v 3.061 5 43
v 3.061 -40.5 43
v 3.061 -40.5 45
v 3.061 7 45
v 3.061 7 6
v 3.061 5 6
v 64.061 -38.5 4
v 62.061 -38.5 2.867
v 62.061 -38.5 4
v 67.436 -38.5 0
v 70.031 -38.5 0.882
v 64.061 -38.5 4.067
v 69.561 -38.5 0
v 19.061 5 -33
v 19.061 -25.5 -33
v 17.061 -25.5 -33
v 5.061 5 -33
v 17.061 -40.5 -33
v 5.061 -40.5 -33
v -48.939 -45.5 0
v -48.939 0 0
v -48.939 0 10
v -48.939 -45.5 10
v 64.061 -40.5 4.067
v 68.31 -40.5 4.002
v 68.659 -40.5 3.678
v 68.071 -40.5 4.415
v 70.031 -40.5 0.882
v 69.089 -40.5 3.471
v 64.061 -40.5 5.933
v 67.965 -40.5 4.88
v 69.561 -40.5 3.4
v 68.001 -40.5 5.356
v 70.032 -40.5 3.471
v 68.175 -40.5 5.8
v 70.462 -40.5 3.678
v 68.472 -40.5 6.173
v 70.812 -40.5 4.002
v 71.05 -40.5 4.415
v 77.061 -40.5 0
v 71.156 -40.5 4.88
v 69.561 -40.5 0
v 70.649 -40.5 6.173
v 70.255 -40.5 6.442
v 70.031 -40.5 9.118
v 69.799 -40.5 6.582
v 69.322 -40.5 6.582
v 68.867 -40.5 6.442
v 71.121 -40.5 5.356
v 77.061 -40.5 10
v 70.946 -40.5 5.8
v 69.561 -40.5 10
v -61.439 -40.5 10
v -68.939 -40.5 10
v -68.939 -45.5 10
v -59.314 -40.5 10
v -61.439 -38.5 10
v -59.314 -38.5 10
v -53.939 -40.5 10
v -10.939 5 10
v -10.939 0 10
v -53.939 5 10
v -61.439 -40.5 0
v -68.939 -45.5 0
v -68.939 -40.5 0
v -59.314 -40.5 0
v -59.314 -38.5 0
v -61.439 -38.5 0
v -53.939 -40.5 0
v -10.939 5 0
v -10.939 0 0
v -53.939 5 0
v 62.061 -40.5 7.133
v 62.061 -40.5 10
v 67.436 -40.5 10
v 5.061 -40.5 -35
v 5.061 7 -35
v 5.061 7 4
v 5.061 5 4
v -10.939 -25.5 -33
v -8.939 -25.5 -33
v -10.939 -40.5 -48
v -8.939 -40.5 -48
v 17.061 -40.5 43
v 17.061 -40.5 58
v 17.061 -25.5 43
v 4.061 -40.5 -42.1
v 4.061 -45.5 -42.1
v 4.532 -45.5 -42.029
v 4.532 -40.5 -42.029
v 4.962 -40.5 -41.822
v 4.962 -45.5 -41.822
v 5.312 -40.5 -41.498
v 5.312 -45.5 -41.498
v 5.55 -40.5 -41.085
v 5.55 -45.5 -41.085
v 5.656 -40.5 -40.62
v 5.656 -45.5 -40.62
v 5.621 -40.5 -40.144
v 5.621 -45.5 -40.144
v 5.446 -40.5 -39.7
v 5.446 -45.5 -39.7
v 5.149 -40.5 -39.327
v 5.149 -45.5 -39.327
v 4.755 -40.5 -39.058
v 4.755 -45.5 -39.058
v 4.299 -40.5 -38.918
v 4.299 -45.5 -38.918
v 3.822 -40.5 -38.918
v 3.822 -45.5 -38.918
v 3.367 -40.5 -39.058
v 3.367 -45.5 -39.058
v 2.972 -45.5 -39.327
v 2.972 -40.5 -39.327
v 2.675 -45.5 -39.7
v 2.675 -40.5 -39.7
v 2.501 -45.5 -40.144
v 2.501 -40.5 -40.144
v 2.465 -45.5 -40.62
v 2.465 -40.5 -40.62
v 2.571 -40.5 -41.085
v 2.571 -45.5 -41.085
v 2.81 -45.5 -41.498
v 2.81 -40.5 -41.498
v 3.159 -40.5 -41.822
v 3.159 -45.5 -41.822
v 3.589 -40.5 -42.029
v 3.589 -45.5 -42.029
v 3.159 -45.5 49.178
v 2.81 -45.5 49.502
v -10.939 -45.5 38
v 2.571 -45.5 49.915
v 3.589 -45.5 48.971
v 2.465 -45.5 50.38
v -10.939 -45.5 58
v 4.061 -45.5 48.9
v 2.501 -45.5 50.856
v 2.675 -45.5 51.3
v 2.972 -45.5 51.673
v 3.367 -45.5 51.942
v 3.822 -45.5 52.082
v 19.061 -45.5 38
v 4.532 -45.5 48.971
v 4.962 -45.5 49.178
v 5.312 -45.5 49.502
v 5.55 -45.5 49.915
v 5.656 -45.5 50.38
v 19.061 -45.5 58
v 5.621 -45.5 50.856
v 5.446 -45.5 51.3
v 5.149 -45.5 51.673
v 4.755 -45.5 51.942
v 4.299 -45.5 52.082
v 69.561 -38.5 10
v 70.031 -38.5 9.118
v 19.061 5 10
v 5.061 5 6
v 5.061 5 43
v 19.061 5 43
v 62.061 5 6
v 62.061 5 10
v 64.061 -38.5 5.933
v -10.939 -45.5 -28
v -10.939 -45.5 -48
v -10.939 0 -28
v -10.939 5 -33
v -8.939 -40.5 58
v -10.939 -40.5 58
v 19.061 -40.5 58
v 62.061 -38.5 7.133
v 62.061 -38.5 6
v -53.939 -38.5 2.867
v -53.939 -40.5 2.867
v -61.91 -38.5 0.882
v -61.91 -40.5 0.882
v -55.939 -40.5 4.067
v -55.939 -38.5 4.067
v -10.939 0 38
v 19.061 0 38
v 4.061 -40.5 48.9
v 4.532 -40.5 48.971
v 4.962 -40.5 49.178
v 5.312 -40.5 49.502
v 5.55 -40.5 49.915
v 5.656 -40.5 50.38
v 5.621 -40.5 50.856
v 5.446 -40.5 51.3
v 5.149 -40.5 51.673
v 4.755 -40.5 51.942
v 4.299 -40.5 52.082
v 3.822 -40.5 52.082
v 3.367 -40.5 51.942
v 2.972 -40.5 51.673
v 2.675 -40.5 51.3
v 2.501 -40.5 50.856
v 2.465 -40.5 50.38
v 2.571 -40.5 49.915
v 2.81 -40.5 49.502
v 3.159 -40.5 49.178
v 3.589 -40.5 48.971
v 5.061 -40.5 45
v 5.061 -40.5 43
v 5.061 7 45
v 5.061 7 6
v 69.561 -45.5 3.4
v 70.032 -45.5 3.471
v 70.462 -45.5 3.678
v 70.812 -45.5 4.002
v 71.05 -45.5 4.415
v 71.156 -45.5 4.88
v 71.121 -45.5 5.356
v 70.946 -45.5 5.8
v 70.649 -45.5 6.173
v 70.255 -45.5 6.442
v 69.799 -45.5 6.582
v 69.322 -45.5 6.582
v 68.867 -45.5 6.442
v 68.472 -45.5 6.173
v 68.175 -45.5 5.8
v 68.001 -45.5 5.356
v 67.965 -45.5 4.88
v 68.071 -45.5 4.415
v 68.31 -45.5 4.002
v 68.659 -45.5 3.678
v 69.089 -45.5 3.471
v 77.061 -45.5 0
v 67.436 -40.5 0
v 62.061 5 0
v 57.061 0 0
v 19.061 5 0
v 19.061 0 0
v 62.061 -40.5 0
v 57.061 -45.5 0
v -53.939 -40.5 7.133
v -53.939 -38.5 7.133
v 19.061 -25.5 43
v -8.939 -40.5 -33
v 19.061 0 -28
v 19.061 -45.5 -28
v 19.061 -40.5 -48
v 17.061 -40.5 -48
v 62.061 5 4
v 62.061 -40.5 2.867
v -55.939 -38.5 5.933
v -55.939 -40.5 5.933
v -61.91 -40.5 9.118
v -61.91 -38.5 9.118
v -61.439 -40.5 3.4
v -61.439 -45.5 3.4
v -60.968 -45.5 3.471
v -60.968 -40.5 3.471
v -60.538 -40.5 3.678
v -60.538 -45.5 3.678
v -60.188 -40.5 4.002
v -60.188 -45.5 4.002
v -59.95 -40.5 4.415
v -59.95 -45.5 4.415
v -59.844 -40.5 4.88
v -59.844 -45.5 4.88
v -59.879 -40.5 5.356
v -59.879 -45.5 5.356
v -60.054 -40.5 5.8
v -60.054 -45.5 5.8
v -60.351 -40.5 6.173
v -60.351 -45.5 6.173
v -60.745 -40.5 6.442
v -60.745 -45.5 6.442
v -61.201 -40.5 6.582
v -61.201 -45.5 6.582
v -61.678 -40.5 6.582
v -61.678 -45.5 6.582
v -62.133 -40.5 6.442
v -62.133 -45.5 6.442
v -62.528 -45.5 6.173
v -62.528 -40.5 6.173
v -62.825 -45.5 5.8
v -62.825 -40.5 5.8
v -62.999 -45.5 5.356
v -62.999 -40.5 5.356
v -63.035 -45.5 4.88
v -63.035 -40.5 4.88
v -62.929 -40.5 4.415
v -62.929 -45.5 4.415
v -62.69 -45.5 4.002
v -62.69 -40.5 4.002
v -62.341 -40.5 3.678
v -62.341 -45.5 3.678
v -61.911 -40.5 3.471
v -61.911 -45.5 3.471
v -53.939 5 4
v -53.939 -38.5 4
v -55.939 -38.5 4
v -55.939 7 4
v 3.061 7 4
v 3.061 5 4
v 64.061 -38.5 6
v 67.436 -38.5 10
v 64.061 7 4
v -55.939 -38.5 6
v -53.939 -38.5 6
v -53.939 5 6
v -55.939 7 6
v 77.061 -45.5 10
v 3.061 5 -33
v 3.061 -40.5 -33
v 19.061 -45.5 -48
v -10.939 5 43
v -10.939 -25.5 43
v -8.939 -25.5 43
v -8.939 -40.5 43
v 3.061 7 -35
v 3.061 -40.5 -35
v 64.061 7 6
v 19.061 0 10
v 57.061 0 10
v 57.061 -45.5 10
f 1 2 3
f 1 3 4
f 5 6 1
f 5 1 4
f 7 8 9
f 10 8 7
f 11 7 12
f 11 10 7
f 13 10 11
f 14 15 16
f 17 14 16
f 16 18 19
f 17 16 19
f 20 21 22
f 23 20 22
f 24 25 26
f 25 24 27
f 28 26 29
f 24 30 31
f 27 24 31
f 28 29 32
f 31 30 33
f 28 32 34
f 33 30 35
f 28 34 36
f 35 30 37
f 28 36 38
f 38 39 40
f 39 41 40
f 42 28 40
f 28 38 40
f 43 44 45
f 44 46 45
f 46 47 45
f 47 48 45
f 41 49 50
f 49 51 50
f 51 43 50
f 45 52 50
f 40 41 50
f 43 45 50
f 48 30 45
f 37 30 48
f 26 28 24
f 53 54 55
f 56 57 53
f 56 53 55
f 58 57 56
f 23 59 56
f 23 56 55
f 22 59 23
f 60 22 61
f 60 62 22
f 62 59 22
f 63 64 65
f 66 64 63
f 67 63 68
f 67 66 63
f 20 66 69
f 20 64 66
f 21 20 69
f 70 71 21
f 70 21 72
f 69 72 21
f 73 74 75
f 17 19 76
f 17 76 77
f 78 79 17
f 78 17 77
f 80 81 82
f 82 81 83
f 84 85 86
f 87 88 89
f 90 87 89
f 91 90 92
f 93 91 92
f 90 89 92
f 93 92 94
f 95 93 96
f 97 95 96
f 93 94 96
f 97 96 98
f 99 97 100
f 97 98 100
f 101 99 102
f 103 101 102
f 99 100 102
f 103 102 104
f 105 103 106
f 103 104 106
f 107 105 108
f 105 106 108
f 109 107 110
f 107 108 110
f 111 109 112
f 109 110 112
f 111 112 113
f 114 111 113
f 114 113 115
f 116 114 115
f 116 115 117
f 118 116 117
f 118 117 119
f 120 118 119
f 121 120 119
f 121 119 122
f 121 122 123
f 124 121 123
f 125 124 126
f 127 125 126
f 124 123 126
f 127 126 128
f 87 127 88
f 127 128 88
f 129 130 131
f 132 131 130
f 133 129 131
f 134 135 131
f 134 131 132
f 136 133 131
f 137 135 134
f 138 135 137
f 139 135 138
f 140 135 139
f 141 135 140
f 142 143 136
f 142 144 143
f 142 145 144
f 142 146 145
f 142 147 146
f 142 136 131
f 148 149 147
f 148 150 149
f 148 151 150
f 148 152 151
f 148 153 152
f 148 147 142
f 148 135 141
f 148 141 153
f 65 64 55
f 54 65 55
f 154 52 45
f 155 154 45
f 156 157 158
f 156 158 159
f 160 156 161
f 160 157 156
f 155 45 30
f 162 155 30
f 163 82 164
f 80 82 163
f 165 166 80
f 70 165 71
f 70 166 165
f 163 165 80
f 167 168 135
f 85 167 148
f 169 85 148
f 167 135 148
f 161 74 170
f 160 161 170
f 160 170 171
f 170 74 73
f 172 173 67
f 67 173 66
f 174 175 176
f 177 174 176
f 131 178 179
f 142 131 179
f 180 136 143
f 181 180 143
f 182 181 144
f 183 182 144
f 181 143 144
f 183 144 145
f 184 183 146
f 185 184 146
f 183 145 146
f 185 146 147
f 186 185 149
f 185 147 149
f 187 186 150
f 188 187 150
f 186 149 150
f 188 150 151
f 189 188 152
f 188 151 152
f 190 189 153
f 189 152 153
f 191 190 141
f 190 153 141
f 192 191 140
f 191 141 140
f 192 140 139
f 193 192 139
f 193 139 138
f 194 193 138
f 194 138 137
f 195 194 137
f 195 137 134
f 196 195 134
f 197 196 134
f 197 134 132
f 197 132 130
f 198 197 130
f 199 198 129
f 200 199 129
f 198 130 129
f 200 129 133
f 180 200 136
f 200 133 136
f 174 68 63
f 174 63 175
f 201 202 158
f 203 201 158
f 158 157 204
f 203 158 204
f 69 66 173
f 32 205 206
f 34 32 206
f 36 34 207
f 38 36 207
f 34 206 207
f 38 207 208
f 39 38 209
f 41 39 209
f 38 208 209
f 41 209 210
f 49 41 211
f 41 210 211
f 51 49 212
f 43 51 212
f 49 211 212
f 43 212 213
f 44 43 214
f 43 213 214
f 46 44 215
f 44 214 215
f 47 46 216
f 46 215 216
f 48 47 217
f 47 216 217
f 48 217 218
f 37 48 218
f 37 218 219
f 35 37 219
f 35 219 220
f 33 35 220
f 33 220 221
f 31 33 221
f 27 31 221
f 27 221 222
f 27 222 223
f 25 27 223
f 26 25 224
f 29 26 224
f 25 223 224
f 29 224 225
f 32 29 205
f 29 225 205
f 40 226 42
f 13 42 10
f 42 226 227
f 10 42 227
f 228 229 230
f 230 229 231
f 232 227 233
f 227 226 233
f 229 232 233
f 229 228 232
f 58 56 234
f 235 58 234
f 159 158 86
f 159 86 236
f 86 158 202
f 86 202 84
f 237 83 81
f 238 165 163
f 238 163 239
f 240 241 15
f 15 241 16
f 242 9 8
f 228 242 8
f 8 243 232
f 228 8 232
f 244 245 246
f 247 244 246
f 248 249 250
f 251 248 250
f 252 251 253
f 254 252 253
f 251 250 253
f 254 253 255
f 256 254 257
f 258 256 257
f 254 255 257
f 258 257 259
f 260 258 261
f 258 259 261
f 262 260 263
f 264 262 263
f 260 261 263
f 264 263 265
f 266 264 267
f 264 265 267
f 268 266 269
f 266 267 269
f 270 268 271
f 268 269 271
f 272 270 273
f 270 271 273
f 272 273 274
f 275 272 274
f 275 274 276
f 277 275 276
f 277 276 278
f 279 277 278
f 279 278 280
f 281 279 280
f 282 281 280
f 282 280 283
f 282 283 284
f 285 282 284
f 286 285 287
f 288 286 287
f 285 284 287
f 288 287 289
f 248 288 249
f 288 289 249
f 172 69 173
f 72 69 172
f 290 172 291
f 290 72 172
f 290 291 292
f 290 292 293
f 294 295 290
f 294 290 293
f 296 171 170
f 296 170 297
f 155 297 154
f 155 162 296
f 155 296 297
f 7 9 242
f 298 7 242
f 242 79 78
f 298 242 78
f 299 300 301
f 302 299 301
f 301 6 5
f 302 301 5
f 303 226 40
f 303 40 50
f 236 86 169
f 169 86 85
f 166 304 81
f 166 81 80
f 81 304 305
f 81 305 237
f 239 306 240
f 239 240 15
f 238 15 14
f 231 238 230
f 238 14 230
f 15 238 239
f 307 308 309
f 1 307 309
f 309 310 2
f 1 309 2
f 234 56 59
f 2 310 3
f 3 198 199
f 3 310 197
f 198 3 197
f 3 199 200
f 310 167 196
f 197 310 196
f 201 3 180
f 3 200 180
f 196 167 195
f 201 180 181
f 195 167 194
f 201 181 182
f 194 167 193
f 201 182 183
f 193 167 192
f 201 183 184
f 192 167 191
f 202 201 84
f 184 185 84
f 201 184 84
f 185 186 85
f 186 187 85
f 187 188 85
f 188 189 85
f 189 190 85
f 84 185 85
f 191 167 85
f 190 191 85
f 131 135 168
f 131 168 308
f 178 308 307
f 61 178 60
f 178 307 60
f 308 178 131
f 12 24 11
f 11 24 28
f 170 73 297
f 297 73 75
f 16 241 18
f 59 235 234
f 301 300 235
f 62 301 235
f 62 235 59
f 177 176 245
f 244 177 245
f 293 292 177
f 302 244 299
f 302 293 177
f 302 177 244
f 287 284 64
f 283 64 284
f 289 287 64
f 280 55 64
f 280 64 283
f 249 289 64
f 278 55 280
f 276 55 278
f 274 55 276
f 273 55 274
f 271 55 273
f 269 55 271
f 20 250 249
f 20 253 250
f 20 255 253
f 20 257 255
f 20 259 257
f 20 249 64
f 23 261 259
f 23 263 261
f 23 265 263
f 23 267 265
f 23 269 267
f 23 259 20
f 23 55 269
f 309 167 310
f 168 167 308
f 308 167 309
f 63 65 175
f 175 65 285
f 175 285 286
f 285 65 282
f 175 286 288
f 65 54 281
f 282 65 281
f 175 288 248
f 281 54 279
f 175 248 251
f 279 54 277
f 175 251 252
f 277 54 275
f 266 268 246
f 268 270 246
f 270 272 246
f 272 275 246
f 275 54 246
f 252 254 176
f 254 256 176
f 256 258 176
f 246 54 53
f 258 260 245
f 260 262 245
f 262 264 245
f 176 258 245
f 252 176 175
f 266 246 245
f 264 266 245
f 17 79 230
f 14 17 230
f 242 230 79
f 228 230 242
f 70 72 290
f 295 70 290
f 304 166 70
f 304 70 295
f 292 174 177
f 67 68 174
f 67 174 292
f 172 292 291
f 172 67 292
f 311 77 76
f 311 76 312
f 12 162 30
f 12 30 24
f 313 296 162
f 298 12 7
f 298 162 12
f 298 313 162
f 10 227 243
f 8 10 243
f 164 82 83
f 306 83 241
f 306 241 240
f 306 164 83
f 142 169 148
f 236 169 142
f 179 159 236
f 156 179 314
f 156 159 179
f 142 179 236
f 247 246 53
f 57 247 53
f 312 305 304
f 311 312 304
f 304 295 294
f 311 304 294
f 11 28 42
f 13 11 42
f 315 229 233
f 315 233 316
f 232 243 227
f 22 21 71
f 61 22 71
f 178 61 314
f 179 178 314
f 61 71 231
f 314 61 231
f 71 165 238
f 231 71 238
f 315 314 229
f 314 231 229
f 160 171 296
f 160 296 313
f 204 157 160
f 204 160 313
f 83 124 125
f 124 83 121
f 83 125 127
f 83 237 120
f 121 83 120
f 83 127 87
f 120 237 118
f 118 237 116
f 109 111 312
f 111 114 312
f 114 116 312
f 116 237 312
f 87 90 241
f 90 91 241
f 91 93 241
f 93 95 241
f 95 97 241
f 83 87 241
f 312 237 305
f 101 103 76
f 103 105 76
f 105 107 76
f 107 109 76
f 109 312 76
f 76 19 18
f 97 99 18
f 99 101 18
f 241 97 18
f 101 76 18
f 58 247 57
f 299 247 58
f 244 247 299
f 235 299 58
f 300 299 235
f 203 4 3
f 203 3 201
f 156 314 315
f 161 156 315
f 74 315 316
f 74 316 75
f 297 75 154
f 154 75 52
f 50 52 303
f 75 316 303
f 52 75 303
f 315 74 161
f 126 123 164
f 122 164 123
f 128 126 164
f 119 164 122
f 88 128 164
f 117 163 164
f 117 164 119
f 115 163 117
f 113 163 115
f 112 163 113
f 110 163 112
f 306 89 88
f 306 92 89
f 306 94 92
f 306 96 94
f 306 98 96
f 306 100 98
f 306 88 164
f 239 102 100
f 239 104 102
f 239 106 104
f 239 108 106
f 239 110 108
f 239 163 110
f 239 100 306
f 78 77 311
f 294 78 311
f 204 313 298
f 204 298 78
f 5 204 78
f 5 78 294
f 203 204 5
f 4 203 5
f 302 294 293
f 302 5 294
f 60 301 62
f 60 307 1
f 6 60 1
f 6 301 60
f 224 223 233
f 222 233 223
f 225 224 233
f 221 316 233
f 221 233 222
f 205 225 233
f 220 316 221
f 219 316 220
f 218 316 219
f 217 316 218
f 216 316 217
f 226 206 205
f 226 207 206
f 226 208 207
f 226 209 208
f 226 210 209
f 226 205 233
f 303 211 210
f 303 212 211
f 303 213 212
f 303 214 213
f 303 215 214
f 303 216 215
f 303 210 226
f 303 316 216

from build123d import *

# Parameters (mm, degrees)
BOSS_EXTRUDE1_DEPTH = 5
SKETCH2_W           = 5
SKETCH2_H           = 10
SKETCH2_W_2         = 30
SKETCH2_H_2         = 5
BOSS_EXTRUDE2_DEPTH = 45.5
SKETCH3_W           = 30
SKETCH3_H           = 15
SKETCH3_R           = 1.6
SKETCH3_W_2         = 15
SKETCH3_H_2         = 10
BOSS_EXTRUDE3_DEPTH = 5
SKETCH4_W           = 2
SKETCH4_H           = 76
SKETCH4_W_2         = 116
SKETCH4_H_2         = 2
EXTRUDE_THIN1_DEPTH = 2
SKETCH5_W           = 2
SKETCH5_H           = 47.5
EXTRUDE_THIN2_DEPTH = 2
SKETCH6_W           = 2
SKETCH6_H           = 47.5
EXTRUDE_THIN3_DEPTH = 2
SKETCH7_W           = 2
SKETCH7_H           = 47.5
EXTRUDE_THIN4_DEPTH = 2
SKETCH8_W           = 2
SKETCH8_H           = 47.5
EXTRUDE_THIN5_DEPTH = 2
RIB2_REACH          = 116.797
SKETCH9_WALL_W      = 252.8063218
SKETCH9_WALL_H      = 2
RIB3_START          = -2
RIB3_DEPTH          = 2
RIB5_REACH          = 116.797
SKETCH11_WALL_W     = 252.8063218
SKETCH11_WALL_H     = 2
RIB6_START          = -2
RIB6_DEPTH          = 2
EXTRUDE_THIN6_DEPTH = 2
SKETCH16_W          = 3.138831492
SKETCH16_H          = 8.051178831
SKETCH16_W_2        = 2.588504754
SKETCH16_H_2        = 9.327196591
CUT_EXTRUDE1_DEPTH  = 164.555036608


# Read off the part's stored shape, not the designer's step: Boss-Extrude1, Rib3, Rib6
with BuildPart() as part:
    # Boss-Extrude1 outline → Boss-Extrude1 (new body)
    with BuildSketch(Plane(origin=(0, 0, 0), x_dir=(1, 0, 0), z_dir=(0, 1, 0))):
        Polygon((19.060732093, 33), (-10.939267907, 33), (-10.939267907, 0), (-53.939267907, 0), (-53.939267907, -10), (-10.939267907, -10), (-10.939267907, -43), (19.060732093, -43), (19.060732093, -10), (62.060732093, -10), (62.060732093, 0), (19.060732093, 0), align=None)
    extrude(amount=BOSS_EXTRUDE1_DEPTH)

    # Sketch2 → Boss-Extrude2 (add)
    with BuildSketch(Plane.XZ):
        with Locations((-51.439267907, 5)):
            Rectangle(SKETCH2_W, SKETCH2_H)
        with Locations((4.060732093, 40.5)):
            Rectangle(SKETCH2_W_2, SKETCH2_H_2)
        with Locations((4.060732093, -30.5)):
            Rectangle(SKETCH2_W_2, SKETCH2_H_2)
        with Locations((59.560732093, 5)):
            Rectangle(SKETCH2_W, SKETCH2_H)
    extrude(amount=BOSS_EXTRUDE2_DEPTH)

    # Sketch3 → Boss-Extrude3 (add)
    # profile 1 of 4: a face of its own
    with BuildSketch(Plane.XZ.offset(45.5)):
        with Locations((4.060732093, 50.5)):
            Rectangle(SKETCH3_W, SKETCH3_H)
        with Locations(Location((4.060732093, 50.5, 0), (0, 0, 270))):
            Circle(SKETCH3_R, mode=Mode.SUBTRACT)
    # profile 2 of 4: a face of its own
    with BuildSketch(Plane.XZ.offset(45.5)):
        with Locations((69.560732093, 5)):
            Rectangle(SKETCH3_W_2, SKETCH3_H_2)
        with Locations(Location((69.560732093, 5, 0), (0, 0, 270))):
            Circle(SKETCH3_R, mode=Mode.SUBTRACT)
    # profile 3 of 4: a face of its own
    with BuildSketch(Plane.XZ.offset(45.5)):
        with Locations((4.060732093, -40.5)):
            Rectangle(SKETCH3_W, SKETCH3_H)
        with Locations(Location((4.060732093, -40.5, 0), (0, 0, 270))):
            Circle(SKETCH3_R, mode=Mode.SUBTRACT)
    # profile 4 of 4: a face of its own
    with BuildSketch(Plane.XZ.offset(45.5)):
        with Locations((-61.439267907, 5)):
            Rectangle(SKETCH3_W_2, SKETCH3_H_2)
        with Locations(Location((-61.439267907, 5, 0), (0, 0, 270))):
            Circle(SKETCH3_R, mode=Mode.SUBTRACT)
    extrude(amount=-BOSS_EXTRUDE3_DEPTH)

    # Sketch4 → Extrude-Thin1 (add)
    with BuildSketch(Plane(origin=(0, 5, 0), x_dir=(1, 0, 0), z_dir=(0, 1, 0))):
        with Locations((4.060732093, -5)):
            Rectangle(SKETCH4_W, SKETCH4_H)
        with Locations((4.060732093, -5)):
            Rectangle(SKETCH4_W_2, SKETCH4_H_2)
    extrude(amount=EXTRUDE_THIN1_DEPTH)

    # Sketch5 → Extrude-Thin2 (add)
    with BuildSketch(Plane.ZY.offset(53.939267907)):
        with Locations((5, -16.75)):
            Rectangle(SKETCH5_W, SKETCH5_H)
    extrude(amount=EXTRUDE_THIN2_DEPTH)

    # Sketch6 → Extrude-Thin3 (add)
    with BuildSketch(Plane(origin=(62.060732093, 0, 0), x_dir=(0, 0, -1), z_dir=(1, 0, 0))):
        with Locations((-5, -16.75)):
            Rectangle(SKETCH6_W, SKETCH6_H)
    extrude(amount=EXTRUDE_THIN3_DEPTH)

    # Sketch7 → Extrude-Thin4 (add)
    with BuildSketch(Plane.XY.offset(43)):
        with Locations((4.060732093, -16.75)):
            Rectangle(SKETCH7_W, SKETCH7_H)
    extrude(amount=EXTRUDE_THIN4_DEPTH)

    # Sketch8 → Extrude-Thin5 (add)
    with BuildSketch(Plane(origin=(0, 0, -33), x_dir=(-1, 0, 0), z_dir=(0, 0, -1))):
        with Locations((-4.060732093, -16.75)):
            Rectangle(SKETCH8_W, SKETCH8_H)
    extrude(amount=EXTRUDE_THIN5_DEPTH)

    # Sketch9 wall → Rib2 (add, up to next)
    with BuildSketch(Plane(origin=(-10.939267907, -33, 50.5), x_dir=(0, 0.707106781187, -0.707106781187), z_dir=(0, -0.707106781187, -0.707106781187)), mode=Mode.PRIVATE) as rib2_sk1:
        with Locations((0, 1)):
            Rectangle(SKETCH9_WALL_W, SKETCH9_WALL_H)
    rib2_tool1 = extrude(rib2_sk1.sketch, amount=RIB2_REACH, mode=Mode.PRIVATE) - part.part
    add(rib2_tool1.solids().sort_by_distance((-10.939267907, -33, 50.5))[0])

    # Rib3 outline → Rib3 (add)
    with BuildSketch(Plane(origin=(19.060732093, 0, 0), x_dir=(0, 0, -1), z_dir=(1, 0, 0)).offset(RIB3_START)):
        Polygon((-43, -25.5), (-58, -40.5), (-43, -40.5), align=None)
    extrude(amount=RIB3_DEPTH)

    # Sketch11 wall → Rib5 (add, up to next)
    with BuildSketch(Plane(origin=(19.060732093, -33, -40.5), x_dir=(0, 0.707106781187, 0.707106781187), z_dir=(0, -0.707106781187, 0.707106781187)), mode=Mode.PRIVATE) as rib5_sk1:
        with Locations((0, 1)):
            Rectangle(SKETCH11_WALL_W, SKETCH11_WALL_H)
    rib5_tool1 = extrude(rib5_sk1.sketch, amount=RIB5_REACH, mode=Mode.PRIVATE) - part.part
    add(rib5_tool1.solids().sort_by_distance((19.060732093, -33, -40.5))[0])

    # Rib6 outline → Rib6 (add)
    with BuildSketch(Plane.ZY.offset(10.939267907).offset(RIB6_START)):
        Polygon((-33, -25.5), (-48, -40.5), (-33, -40.5), align=None)
    extrude(amount=RIB6_DEPTH)

    # Sketch15 → Extrude-Thin6 (add)
    with BuildSketch(Plane(origin=(0, -40.5, 0), x_dir=(1, 0, 0), z_dir=(0, 1, 0))):
        Polygon((-53.468679672, -3.117647059), (-60.968679672, 0.882352941), (-61.909856142, -0.882352941), (-54.409856142, -4.882352941), align=None)
        Polygon((-54.409856142, -5.117647059), (-61.909856142, -9.117647059), (-60.968679672, -10.882352941), (-53.468679672, -6.882352941), align=None)
        Polygon((62.531320328, -4.882352941), (70.031320328, -0.882352941), (69.090143858, 0.882352941), (61.590143858, -3.117647059), align=None)
        Polygon((61.590143858, -6.882352941), (69.090143858, -10.882352941), (70.031320328, -9.117647059), (62.531320328, -5.117647059), align=None)
    extrude(amount=EXTRUDE_THIN6_DEPTH)

    # Sketch16 → Cut-Extrude1 (cut, through all)
    with BuildSketch(Plane(origin=(77.060732093, 0, 0), x_dir=(0, 0, -1), z_dir=(1, 0, 0))):
        with Locations((-11.569415746, -41.474410585)):
            Rectangle(SKETCH16_W, SKETCH16_H)
        with Locations((1.294252377, -40.836401705)):
            Rectangle(SKETCH16_W_2, SKETCH16_H_2)
    extrude(amount=-CUT_EXTRUDE1_DEPTH, mode=Mode.SUBTRACT)


solid = part.part
